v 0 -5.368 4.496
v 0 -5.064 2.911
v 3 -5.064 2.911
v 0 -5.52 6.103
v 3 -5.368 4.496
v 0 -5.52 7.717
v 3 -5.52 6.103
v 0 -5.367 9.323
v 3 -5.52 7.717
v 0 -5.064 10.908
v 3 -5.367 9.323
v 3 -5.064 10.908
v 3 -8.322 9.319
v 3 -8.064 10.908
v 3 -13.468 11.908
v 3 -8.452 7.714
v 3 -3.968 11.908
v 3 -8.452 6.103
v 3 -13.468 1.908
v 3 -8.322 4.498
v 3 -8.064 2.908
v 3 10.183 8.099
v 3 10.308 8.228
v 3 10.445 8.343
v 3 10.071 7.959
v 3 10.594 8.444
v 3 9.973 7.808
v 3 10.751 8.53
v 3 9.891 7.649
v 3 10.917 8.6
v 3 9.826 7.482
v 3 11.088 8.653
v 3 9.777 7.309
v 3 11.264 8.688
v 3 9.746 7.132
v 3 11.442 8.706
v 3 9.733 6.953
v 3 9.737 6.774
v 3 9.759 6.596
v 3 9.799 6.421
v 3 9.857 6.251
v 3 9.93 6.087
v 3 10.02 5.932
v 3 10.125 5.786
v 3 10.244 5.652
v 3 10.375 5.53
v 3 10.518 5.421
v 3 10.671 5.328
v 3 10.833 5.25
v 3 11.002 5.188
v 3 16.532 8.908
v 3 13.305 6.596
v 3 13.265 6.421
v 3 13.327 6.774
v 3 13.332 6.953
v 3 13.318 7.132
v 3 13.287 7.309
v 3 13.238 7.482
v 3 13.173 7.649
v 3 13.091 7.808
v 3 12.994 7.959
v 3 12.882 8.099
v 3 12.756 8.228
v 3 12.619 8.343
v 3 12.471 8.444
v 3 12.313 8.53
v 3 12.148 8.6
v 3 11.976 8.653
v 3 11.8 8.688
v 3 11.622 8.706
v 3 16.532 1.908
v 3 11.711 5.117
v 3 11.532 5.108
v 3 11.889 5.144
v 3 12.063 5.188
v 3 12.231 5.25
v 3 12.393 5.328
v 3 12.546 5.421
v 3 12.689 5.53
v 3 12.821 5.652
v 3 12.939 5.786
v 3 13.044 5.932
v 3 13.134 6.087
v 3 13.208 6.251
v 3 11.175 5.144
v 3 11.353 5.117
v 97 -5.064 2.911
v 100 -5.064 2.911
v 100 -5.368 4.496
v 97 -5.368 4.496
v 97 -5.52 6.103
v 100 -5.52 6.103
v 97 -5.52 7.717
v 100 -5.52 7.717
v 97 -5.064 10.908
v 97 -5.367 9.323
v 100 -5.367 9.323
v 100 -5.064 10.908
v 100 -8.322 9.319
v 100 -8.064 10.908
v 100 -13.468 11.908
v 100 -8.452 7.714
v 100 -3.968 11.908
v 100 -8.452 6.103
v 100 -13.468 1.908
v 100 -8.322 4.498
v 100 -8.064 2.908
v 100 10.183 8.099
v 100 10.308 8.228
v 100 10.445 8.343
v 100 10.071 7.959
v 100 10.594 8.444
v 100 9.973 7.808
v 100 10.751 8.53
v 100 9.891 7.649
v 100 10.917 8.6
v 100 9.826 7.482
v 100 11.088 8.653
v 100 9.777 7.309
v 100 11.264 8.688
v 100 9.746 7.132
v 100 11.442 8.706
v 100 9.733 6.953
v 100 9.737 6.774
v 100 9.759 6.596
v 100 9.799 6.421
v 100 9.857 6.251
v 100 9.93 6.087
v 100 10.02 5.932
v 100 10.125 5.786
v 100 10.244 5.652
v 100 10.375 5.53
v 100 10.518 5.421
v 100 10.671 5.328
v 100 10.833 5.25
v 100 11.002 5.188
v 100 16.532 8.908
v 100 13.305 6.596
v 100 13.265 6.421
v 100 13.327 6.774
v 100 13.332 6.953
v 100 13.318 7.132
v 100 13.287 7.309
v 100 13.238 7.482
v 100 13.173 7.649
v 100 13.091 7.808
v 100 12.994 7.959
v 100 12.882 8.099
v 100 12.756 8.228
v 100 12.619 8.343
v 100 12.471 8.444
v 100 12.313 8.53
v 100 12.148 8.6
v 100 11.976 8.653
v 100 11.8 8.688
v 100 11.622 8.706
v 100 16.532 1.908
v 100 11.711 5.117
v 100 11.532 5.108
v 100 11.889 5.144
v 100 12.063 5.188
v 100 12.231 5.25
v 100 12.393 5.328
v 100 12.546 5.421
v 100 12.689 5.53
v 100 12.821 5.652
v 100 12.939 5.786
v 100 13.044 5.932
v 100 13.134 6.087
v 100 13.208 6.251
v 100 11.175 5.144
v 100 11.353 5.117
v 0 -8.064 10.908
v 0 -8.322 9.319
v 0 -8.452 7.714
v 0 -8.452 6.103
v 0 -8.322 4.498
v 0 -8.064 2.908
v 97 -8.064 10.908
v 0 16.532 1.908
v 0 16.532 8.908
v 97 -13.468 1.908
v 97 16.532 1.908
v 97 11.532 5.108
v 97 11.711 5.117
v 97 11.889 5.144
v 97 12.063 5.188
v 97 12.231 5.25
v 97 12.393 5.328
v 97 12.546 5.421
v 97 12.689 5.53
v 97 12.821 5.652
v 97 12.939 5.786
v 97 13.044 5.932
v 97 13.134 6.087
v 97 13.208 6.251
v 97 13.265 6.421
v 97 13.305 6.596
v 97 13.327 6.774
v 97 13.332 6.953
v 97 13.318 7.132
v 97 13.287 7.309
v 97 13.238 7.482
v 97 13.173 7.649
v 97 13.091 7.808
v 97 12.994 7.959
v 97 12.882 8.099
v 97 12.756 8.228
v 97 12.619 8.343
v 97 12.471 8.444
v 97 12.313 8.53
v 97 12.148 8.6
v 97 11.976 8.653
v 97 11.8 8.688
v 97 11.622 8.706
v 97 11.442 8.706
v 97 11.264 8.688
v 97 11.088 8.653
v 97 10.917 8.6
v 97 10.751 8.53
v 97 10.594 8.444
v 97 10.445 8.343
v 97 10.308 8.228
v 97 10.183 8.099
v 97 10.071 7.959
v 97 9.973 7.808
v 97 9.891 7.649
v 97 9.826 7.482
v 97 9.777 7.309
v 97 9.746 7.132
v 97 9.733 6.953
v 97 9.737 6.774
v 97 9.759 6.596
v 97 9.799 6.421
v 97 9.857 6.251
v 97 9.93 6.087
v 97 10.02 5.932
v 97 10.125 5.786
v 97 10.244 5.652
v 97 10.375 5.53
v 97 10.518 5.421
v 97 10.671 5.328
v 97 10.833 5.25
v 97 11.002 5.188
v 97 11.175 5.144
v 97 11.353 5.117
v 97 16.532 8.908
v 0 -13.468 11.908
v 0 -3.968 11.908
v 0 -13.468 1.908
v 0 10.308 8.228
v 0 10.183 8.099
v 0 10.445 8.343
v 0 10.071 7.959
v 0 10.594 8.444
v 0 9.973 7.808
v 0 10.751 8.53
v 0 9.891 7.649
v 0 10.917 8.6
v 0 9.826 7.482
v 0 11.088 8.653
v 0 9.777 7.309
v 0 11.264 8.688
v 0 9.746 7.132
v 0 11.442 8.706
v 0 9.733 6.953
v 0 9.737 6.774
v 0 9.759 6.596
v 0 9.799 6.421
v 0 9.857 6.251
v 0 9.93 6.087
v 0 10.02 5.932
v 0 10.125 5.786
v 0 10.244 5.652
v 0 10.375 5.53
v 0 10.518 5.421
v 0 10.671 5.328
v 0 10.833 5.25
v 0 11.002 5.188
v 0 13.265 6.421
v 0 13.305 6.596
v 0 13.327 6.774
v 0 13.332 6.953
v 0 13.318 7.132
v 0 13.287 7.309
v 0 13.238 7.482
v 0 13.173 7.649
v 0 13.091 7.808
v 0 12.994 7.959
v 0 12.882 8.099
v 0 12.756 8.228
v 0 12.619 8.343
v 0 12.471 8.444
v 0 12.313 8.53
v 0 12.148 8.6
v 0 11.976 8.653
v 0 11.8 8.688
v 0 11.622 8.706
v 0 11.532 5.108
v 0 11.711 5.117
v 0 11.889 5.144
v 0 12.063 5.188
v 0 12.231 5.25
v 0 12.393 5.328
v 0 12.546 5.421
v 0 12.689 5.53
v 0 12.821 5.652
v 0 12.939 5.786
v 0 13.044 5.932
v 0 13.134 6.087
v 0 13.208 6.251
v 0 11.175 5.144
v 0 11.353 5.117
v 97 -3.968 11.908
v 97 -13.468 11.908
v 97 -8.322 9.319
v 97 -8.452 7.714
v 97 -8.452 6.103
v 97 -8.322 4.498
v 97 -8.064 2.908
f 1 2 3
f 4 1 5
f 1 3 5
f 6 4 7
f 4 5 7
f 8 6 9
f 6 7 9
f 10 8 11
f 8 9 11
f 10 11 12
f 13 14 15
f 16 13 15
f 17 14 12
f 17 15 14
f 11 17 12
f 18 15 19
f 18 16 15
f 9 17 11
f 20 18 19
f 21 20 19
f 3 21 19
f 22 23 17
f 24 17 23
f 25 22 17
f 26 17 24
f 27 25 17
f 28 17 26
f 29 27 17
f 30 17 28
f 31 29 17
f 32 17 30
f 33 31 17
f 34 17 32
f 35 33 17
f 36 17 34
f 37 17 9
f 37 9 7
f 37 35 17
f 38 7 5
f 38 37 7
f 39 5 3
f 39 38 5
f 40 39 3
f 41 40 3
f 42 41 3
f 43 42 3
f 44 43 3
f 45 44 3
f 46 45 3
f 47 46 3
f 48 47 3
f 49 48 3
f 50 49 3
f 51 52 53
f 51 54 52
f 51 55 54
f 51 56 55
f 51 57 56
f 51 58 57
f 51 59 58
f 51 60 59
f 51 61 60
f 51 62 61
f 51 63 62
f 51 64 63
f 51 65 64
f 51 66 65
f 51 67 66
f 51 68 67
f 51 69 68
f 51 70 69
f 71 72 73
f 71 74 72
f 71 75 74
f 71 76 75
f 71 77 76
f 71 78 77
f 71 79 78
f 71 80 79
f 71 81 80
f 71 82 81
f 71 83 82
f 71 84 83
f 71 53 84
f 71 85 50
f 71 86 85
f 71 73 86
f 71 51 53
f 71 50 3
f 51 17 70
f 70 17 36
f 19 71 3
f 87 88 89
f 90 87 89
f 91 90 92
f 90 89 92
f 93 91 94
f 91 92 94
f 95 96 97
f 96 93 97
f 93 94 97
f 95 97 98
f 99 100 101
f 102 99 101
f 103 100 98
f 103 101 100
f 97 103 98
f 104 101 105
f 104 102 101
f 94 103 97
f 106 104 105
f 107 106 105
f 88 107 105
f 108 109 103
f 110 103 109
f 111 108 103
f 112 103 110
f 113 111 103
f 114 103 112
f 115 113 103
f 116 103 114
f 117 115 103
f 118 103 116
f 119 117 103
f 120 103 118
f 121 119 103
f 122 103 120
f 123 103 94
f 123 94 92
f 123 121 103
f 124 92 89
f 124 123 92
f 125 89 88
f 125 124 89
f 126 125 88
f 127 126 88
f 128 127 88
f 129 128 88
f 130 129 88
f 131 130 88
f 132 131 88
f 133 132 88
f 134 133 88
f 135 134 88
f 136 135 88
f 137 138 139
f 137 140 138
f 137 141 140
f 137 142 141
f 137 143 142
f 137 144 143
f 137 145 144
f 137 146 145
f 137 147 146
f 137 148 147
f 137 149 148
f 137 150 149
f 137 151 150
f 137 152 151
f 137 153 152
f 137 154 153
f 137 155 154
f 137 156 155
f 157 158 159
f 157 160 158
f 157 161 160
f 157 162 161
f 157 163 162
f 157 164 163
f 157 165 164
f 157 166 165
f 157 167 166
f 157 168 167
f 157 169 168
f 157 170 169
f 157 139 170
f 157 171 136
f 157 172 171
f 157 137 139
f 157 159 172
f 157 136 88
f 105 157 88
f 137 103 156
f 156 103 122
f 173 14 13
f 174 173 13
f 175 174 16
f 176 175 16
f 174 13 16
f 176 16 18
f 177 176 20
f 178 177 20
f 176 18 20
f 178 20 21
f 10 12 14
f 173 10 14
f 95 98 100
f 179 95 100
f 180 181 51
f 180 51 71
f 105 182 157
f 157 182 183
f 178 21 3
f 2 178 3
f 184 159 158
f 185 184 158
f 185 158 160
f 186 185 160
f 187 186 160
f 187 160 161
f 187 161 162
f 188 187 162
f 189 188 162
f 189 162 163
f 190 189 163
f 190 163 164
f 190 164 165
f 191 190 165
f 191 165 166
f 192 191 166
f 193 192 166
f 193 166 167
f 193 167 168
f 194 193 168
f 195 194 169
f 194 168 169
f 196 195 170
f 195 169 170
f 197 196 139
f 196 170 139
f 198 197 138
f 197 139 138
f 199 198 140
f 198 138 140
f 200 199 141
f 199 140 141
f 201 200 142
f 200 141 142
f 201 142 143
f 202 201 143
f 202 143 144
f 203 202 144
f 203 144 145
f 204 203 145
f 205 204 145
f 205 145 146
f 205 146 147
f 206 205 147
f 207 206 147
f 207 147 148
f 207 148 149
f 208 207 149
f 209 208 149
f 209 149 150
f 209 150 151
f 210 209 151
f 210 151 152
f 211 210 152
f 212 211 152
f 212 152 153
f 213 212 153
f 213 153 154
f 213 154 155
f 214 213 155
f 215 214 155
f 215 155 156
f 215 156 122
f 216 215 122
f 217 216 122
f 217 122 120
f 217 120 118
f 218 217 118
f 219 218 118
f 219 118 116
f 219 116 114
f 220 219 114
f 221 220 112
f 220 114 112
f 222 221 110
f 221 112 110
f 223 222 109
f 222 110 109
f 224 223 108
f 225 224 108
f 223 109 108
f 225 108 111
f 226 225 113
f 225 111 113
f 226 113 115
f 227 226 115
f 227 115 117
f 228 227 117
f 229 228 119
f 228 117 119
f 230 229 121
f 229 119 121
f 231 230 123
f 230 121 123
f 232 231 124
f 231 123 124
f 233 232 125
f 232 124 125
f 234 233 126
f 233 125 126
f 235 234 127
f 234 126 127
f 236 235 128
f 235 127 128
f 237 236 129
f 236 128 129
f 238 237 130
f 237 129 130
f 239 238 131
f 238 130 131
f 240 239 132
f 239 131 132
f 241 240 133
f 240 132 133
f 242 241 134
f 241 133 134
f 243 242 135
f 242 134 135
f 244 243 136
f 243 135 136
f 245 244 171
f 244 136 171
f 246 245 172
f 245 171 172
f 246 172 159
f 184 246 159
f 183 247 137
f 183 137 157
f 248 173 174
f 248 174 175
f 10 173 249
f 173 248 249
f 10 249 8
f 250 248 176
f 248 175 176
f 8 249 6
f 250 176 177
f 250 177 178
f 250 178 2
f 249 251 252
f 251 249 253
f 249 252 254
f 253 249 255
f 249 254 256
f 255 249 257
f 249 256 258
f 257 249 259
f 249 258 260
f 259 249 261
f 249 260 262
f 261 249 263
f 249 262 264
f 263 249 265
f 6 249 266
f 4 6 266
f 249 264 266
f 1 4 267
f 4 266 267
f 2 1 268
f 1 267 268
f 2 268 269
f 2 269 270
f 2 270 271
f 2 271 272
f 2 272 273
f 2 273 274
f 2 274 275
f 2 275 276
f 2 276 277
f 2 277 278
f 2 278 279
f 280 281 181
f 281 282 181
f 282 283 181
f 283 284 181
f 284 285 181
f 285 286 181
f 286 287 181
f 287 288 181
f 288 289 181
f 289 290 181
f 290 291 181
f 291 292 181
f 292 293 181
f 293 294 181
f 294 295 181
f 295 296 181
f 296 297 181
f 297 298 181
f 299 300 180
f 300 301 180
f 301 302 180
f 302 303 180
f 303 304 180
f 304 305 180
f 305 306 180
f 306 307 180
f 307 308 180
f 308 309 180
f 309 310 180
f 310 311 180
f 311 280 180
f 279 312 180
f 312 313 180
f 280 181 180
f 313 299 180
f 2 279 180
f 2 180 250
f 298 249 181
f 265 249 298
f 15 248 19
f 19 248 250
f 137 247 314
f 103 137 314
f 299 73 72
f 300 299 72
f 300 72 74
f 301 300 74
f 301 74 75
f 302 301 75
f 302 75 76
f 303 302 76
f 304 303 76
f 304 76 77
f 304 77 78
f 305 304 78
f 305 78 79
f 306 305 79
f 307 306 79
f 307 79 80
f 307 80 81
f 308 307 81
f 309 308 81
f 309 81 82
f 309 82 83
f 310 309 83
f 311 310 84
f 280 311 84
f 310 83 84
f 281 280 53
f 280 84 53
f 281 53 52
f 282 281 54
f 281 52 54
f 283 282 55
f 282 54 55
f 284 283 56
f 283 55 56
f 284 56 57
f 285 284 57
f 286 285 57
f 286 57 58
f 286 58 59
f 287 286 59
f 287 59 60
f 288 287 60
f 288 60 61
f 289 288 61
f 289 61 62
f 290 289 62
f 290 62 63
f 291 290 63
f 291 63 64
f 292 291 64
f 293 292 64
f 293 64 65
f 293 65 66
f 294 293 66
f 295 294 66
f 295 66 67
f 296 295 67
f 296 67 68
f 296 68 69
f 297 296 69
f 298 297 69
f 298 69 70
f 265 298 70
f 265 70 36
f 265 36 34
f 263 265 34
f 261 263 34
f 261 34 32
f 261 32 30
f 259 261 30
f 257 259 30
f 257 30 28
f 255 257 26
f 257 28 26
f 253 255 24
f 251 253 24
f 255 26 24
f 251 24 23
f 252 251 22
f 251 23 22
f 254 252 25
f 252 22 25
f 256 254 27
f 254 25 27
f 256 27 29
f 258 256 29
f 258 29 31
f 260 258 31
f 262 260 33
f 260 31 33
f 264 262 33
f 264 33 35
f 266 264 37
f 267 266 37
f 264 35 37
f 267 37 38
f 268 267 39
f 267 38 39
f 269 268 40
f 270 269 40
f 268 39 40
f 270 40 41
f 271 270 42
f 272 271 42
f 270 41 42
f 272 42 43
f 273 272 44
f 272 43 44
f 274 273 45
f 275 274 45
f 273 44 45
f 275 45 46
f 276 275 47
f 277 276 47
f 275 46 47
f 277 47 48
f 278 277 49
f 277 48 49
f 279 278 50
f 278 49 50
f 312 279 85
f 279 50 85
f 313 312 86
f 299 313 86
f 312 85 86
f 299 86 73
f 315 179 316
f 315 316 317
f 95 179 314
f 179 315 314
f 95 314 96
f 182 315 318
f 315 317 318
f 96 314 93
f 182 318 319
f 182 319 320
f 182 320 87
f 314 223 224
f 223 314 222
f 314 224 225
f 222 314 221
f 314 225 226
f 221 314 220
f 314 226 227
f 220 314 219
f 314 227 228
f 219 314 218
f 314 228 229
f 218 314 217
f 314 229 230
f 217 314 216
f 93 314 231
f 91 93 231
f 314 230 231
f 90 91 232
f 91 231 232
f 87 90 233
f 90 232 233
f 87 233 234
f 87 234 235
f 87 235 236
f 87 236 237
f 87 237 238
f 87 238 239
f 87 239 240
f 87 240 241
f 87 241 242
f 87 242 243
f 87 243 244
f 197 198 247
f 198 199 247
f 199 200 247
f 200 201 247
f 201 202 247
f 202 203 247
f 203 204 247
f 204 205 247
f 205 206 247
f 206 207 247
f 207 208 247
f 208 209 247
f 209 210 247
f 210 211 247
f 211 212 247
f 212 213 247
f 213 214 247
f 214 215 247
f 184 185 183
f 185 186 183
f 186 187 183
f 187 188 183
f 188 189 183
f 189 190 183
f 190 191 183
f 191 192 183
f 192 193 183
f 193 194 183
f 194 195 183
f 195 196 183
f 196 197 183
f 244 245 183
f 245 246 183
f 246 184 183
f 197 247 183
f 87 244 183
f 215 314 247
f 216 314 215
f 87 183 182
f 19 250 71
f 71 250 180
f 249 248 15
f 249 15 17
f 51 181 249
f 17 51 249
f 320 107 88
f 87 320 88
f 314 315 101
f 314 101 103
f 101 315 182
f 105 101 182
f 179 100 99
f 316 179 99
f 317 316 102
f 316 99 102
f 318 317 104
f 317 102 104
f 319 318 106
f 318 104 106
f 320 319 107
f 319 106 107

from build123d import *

# Parameters (mm, degrees)
SKETCH1_W           = 10
SKETCH1_H           = 30
BOSS_EXTRUDE1_DEPTH = 100
SKETCH2_W           = 94
SKETCH2_H           = 10
CUT_EXTRUDE1_DEPTH  = 100
SKETCH3_R           = 1.8
CUT_EXTRUDE2_DEPTH  = 100
CUT_EXTRUDE3_DEPTH  = 100
CUT_EXTRUDE5_DEPTH  = 100


with BuildPart() as part:
    # Sketch1 → Boss-Extrude1 (new body)
    with BuildSketch(Plane(origin=(0, 0, 0), x_dir=(0, 0, -1), z_dir=(1, 0, 0))):
        with Locations((-6.908426326, 1.532136894)):
            Rectangle(SKETCH1_W, SKETCH1_H)
    extrude(amount=BOSS_EXTRUDE1_DEPTH)

    # Sketch2 → Cut-Extrude1 (cut)
    with BuildSketch(Plane(origin=(0, 16.532136894, 0), x_dir=(1, 0, 0), z_dir=(0, 1, 0))):
        with Locations((50, -6.908426326)):
            Rectangle(SKETCH2_W, SKETCH2_H)
    extrude(amount=-CUT_EXTRUDE1_DEPTH, mode=Mode.SUBTRACT)

    # Sketch3 → Cut-Extrude2 (cut)
    with BuildSketch(Plane(origin=(100, 0, 0), x_dir=(0, 0, -1), z_dir=(1, 0, 0))):
        with Locations((-6.908426326, 11.532136894)):
            Circle(SKETCH3_R)
    extrude(amount=-CUT_EXTRUDE2_DEPTH, mode=Mode.SUBTRACT)

    # Sketch4 → Cut-Extrude3 (cut)
    with BuildSketch(Plane(origin=(100, 0, 0), x_dir=(0, 0, -1), z_dir=(1, 0, 0))):
        with BuildLine():
            Line((-10.908426326, -5.063781049), (-10.908426326, -8.063781049))
            ThreePointArc((-10.908426326, -8.063781049), (-6.908426326, -8.467863106), (-2.908426326, -8.063781049))
            Line((-2.908426326, -8.063781049), (-2.910860918, -5.064367653))
            ThreePointArc((-2.910860918, -5.064367653), (-6.909678458, -5.539022727), (-10.908426326, -5.063781049))
        make_face()
    extrude(amount=-CUT_EXTRUDE3_DEPTH, mode=Mode.SUBTRACT)

    # Sketch5 → Cut-Extrude5 (cut)
    with BuildSketch(Plane.ZY):
        Polygon((8.908426326, 16.532136894), (11.908426326, -3.967863106), (11.908426326, 16.532136894), align=None)
    extrude(amount=-CUT_EXTRUDE5_DEPTH, mode=Mode.SUBTRACT)


solid = part.part
